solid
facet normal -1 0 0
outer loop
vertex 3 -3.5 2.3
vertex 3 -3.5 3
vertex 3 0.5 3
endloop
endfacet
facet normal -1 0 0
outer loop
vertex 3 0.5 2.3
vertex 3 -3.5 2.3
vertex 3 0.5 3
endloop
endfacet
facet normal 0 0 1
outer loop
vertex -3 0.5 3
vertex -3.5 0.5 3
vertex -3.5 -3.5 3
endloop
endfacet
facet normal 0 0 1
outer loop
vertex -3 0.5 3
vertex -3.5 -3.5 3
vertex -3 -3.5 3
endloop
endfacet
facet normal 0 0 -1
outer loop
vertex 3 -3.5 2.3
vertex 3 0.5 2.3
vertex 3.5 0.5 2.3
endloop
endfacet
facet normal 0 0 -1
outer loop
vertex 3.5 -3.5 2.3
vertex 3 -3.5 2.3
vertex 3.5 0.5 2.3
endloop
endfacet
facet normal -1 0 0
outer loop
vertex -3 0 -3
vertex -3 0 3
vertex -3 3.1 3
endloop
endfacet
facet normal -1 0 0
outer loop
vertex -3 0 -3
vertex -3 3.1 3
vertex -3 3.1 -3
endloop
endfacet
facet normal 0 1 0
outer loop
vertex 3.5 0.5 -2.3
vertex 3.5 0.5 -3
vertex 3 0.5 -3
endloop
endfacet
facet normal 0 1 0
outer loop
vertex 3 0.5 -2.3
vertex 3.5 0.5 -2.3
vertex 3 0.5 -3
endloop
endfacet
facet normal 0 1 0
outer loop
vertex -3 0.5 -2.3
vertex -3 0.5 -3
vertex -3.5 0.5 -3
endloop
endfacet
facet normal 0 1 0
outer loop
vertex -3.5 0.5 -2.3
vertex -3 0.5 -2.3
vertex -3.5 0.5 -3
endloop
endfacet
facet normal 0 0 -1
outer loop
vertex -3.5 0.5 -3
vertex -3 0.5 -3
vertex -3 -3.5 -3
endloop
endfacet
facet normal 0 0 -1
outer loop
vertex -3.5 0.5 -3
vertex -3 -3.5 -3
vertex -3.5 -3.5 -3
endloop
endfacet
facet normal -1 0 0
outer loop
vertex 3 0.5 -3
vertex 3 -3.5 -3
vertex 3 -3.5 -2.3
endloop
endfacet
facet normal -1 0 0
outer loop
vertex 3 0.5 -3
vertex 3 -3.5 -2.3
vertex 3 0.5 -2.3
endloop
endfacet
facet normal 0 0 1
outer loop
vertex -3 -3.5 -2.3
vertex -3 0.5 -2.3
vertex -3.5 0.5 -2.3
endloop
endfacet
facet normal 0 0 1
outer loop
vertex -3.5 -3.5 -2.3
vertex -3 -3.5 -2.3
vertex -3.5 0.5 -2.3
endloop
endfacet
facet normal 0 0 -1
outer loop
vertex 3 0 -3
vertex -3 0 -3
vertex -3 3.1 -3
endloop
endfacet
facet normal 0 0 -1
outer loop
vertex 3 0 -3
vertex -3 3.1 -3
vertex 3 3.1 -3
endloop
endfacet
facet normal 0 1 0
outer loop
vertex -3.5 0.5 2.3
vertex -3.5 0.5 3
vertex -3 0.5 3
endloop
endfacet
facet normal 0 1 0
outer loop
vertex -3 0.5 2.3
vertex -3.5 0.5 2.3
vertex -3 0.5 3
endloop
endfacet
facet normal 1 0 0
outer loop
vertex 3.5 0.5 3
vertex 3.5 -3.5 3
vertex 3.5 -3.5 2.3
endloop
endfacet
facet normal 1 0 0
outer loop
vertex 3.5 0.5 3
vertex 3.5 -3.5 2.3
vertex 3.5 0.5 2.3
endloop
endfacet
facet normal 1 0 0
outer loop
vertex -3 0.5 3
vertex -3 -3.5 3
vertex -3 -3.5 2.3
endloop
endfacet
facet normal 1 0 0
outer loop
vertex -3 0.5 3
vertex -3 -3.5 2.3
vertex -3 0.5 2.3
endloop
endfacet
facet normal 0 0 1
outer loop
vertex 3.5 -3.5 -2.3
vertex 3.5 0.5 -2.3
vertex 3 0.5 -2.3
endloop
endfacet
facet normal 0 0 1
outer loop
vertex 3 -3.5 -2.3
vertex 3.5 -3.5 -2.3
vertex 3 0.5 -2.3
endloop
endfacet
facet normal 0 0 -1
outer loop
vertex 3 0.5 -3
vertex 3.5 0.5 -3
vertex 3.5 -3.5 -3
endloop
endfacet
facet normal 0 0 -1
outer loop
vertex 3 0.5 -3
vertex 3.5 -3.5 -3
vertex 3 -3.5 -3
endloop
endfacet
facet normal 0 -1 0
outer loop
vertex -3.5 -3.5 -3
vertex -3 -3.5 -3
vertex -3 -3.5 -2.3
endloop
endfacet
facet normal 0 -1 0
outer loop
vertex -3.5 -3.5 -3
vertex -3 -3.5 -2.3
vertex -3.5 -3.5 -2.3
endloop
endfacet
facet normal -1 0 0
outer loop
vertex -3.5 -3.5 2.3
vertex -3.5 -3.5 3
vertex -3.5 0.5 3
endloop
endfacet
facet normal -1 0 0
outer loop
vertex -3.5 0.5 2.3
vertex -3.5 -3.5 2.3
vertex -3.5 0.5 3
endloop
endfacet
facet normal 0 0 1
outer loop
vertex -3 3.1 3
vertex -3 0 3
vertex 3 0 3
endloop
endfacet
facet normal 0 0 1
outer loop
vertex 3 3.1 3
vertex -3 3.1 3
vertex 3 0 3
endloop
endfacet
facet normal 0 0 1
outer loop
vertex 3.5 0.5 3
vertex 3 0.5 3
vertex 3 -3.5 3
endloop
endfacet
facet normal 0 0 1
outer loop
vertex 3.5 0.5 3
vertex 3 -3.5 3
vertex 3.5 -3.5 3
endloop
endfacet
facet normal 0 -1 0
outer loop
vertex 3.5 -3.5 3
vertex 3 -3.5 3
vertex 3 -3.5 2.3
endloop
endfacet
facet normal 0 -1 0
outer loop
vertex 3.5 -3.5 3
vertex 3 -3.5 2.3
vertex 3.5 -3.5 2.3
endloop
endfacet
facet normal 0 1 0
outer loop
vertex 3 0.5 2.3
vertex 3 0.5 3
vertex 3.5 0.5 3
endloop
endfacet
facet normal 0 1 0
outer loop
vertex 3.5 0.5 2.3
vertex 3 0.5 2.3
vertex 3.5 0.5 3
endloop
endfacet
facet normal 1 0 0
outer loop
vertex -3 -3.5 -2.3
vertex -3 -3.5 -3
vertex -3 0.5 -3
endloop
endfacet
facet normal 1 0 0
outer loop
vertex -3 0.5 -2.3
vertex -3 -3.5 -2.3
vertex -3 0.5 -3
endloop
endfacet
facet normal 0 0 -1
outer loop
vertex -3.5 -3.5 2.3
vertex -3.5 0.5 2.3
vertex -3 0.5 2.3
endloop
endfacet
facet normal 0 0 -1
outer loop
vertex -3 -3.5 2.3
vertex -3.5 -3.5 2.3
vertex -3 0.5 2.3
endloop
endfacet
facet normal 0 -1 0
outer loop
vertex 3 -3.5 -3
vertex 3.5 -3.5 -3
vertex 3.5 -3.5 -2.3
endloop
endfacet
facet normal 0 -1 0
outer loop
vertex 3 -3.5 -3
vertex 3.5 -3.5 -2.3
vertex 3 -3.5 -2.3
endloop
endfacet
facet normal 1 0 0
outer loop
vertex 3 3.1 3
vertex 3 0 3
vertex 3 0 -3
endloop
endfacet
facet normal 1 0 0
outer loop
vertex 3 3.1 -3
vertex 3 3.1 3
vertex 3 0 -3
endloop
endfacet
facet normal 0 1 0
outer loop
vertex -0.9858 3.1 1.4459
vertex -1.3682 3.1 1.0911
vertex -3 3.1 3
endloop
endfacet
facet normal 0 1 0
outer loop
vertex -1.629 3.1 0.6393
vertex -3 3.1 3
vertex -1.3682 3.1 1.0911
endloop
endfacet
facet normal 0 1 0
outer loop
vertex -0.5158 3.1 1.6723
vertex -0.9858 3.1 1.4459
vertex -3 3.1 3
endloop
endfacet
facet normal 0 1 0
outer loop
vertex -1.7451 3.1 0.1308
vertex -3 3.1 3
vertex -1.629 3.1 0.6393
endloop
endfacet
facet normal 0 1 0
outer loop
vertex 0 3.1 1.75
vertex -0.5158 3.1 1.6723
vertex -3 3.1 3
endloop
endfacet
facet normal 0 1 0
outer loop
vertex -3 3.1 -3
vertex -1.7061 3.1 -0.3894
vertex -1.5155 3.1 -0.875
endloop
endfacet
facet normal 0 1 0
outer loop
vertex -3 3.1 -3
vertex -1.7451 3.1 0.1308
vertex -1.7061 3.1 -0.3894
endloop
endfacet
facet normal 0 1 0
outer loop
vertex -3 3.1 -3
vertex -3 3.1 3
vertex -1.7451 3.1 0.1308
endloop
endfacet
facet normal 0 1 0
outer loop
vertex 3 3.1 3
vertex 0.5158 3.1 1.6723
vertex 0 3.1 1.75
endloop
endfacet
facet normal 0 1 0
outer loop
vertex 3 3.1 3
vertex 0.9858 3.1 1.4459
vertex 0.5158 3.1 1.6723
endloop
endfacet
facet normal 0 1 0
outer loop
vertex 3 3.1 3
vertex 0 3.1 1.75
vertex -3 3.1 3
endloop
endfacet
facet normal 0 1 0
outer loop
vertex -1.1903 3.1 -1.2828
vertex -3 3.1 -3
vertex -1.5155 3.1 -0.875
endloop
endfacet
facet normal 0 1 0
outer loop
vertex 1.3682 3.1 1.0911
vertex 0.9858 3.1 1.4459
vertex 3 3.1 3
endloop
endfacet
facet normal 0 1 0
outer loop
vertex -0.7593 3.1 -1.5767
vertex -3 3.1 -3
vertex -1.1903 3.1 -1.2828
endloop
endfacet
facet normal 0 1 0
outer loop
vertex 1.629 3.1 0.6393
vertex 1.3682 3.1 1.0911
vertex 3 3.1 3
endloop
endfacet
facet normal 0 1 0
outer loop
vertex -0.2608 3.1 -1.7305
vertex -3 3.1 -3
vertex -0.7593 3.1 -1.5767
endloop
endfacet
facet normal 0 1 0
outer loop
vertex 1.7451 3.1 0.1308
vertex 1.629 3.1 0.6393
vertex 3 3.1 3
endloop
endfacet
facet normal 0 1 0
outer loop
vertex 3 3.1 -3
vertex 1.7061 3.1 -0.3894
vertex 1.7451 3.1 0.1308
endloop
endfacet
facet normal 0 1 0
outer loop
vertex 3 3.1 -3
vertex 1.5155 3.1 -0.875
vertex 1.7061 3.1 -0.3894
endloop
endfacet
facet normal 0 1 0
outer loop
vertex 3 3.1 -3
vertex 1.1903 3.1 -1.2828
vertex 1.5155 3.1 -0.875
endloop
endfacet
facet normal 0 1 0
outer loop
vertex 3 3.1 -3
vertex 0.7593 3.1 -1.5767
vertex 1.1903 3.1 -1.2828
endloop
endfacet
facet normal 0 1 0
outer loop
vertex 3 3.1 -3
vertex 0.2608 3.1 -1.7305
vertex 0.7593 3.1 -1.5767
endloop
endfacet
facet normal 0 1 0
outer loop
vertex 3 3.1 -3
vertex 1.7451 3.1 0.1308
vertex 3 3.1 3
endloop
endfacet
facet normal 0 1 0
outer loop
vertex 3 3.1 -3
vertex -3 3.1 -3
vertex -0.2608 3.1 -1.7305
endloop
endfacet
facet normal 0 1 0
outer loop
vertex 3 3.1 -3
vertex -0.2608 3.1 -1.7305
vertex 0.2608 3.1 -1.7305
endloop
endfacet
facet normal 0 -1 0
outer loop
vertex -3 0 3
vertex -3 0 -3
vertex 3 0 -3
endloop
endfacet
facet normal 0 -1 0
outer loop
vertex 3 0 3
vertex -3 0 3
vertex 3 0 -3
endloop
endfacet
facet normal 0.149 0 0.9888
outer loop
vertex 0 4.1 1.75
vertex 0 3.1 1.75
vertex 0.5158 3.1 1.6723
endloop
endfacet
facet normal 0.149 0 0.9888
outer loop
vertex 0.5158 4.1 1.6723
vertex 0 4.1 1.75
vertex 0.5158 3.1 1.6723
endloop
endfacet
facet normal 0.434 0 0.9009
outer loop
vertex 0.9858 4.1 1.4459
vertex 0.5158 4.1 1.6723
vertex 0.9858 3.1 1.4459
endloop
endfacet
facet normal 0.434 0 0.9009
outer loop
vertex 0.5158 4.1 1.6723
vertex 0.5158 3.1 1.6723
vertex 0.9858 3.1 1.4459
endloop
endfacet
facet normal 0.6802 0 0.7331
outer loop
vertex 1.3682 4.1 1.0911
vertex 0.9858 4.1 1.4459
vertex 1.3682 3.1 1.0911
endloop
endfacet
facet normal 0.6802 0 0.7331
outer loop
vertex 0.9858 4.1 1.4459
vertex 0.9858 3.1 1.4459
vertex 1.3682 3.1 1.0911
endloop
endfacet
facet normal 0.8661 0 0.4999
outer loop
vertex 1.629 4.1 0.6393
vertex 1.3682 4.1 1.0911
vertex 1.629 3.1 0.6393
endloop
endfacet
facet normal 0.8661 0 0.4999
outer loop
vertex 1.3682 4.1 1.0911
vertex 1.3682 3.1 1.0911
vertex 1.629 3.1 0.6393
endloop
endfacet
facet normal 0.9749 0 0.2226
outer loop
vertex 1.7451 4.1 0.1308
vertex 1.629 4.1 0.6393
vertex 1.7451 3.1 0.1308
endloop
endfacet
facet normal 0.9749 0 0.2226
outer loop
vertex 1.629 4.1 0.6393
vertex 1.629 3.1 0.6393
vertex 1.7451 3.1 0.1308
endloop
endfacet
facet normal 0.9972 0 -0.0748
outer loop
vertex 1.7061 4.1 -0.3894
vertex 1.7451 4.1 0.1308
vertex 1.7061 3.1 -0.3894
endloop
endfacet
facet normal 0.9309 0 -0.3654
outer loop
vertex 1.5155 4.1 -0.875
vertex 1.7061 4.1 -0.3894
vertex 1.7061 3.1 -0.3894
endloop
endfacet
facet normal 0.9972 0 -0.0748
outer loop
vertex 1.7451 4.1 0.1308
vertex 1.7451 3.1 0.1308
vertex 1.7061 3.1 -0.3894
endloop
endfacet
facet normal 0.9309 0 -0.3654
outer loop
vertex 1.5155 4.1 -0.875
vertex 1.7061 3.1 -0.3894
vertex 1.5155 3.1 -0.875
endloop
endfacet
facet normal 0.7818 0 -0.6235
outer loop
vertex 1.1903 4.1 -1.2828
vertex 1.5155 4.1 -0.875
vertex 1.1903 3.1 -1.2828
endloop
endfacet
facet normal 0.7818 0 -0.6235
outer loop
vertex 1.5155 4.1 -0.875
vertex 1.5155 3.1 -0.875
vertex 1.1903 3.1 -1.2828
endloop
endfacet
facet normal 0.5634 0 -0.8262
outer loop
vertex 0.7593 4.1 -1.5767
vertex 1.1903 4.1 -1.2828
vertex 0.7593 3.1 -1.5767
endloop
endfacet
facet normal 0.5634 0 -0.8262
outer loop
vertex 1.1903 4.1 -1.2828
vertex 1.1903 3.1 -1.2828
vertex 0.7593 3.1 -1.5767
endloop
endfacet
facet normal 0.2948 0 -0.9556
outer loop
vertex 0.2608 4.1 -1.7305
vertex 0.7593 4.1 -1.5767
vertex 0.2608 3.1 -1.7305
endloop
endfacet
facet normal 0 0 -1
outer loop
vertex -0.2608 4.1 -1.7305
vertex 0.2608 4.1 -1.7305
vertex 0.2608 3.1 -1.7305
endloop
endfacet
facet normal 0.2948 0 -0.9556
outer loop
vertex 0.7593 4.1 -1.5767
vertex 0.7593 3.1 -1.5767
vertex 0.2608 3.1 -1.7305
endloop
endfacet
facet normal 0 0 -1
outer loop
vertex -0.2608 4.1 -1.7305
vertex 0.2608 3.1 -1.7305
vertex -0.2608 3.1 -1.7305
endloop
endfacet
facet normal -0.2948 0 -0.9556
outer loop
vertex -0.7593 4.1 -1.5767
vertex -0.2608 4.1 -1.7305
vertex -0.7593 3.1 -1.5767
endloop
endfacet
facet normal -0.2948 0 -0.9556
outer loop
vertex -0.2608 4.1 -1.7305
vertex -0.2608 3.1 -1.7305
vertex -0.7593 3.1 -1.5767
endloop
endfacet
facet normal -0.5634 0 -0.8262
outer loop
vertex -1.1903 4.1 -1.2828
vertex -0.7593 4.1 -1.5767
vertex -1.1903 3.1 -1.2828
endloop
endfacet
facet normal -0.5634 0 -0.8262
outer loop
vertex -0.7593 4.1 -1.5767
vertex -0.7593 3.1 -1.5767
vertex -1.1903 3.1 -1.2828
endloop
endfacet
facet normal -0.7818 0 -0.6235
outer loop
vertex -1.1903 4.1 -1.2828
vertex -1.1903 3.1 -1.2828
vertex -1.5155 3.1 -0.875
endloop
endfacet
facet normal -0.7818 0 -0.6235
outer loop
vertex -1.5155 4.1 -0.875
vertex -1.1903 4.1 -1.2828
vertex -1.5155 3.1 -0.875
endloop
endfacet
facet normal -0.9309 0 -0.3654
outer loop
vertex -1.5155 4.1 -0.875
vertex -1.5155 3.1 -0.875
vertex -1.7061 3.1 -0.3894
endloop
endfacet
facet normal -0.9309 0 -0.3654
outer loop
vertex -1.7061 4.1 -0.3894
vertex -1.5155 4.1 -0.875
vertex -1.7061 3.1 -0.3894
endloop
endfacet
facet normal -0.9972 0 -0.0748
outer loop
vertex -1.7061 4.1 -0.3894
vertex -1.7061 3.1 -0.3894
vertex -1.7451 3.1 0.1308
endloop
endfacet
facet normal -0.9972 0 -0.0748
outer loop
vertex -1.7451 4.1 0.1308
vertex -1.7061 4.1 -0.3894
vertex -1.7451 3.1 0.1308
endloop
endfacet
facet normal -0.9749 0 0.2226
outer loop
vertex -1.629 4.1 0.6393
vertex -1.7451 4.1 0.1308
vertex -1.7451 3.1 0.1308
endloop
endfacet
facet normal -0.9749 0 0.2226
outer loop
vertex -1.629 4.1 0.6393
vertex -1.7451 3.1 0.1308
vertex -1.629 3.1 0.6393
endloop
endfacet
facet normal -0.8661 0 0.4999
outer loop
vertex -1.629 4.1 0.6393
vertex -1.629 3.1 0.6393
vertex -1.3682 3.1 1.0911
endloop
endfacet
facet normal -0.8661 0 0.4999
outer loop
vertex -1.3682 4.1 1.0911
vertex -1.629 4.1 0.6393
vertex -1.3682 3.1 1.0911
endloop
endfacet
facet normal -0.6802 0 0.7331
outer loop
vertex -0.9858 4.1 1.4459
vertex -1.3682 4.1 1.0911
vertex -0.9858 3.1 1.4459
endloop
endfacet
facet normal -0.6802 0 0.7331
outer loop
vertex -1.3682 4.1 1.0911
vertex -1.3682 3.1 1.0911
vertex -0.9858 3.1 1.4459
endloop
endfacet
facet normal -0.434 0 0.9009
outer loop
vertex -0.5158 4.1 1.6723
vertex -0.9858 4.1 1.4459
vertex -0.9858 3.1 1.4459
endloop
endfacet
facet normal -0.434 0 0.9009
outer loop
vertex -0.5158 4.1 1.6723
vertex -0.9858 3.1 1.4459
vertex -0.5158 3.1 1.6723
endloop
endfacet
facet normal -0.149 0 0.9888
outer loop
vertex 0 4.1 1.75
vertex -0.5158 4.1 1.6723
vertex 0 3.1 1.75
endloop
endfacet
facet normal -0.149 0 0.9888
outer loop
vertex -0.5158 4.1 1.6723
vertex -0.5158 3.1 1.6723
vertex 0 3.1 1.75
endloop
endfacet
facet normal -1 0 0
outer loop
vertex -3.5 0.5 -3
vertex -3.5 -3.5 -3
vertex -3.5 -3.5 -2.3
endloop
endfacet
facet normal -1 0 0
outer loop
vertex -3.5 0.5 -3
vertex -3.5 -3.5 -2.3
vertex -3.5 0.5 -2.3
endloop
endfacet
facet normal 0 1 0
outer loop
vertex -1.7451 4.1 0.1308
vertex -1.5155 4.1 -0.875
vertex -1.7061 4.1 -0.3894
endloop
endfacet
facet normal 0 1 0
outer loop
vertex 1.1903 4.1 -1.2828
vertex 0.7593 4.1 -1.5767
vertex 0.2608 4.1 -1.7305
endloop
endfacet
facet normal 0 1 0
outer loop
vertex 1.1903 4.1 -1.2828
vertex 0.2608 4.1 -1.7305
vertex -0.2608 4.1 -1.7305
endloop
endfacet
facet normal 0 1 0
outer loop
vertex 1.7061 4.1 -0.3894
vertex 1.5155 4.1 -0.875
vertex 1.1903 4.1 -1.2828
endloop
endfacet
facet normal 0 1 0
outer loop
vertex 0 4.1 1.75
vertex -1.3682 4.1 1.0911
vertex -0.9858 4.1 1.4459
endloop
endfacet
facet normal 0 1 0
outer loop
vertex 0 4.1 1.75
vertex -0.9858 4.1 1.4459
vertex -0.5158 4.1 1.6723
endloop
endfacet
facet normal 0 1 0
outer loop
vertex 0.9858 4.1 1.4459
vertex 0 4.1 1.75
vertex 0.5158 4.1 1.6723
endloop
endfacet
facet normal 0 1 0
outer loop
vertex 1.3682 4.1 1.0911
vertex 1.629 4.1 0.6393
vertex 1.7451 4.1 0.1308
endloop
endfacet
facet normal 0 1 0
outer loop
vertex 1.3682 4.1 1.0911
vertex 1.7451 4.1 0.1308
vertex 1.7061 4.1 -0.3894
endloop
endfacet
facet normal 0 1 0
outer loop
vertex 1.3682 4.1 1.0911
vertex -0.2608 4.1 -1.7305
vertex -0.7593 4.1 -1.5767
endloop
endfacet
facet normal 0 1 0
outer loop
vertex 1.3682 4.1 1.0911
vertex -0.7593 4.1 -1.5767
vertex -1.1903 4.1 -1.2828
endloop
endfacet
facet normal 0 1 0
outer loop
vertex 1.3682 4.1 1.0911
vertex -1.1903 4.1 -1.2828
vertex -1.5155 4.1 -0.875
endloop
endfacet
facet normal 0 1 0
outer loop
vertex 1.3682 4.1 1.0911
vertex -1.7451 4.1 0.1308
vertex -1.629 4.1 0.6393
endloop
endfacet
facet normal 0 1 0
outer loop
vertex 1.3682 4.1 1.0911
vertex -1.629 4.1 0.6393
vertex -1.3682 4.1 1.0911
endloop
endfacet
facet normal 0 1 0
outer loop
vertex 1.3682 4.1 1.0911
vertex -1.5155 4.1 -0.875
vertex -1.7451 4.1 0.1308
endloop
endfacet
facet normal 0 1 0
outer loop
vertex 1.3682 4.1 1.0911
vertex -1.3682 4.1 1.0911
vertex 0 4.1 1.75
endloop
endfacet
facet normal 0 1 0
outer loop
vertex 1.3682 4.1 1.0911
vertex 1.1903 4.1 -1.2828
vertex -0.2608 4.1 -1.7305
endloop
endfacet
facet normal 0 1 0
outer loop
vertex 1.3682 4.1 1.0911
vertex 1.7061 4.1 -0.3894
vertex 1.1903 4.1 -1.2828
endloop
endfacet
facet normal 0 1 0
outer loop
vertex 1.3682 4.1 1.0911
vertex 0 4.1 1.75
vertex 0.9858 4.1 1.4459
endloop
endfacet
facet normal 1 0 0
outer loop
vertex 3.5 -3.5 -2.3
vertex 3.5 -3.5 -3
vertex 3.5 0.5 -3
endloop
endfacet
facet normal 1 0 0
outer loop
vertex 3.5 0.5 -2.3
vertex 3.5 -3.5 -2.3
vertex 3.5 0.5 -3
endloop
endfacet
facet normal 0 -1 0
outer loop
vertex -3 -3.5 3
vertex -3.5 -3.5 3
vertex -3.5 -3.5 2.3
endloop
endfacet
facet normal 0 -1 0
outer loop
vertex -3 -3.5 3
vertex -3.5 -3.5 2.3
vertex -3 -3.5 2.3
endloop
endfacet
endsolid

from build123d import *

# Parameters (mm, degrees)
SKETCH1_W             = 6
SKETCH1_H             = 6
BOSS_EXTRUDE1_DEPTH   = 3.1
SKETCH2_R             = 1.75
BOSS_EXTRUDE2_DEPTH   = 1
SKETCH3_W             = 0.5
SKETCH3_H             = 4
BOSS_EXTRUDE3_DEPTH   = 0.7
BOSS_EXTRUDE3_2_DEPTH = 0.7
SKETCH4_W             = 0.5
SKETCH4_H             = 4
BOSS_EXTRUDE4_DEPTH   = 0.7
BOSS_EXTRUDE4_2_DEPTH = 0.7


with BuildPart() as part:
    # Sketch1 → Boss-Extrude1 (new body)
    with BuildSketch(Plane(origin=(0, 0, 0), x_dir=(1, 0, 0), z_dir=(0, 1, 0))):
        Rectangle(SKETCH1_W, SKETCH1_H)
    extrude(amount=BOSS_EXTRUDE1_DEPTH)

    # Sketch2 → Boss-Extrude2 (add)
    with BuildSketch(Plane(origin=(0, 3.1, 0), x_dir=(1, 0, 0), z_dir=(0, 1, 0))):
        with Locations(Location((0, 0, 0), (0, 0, 270))):
            Circle(SKETCH2_R)
    extrude(amount=BOSS_EXTRUDE2_DEPTH)


with BuildPart() as body_2:
    # Sketch3 → Boss-Extrude3 (new body)
    with BuildSketch(Plane.XY.offset(3)):
        with Locations((3.25, -1.5)):
            Rectangle(SKETCH3_W, SKETCH3_H)
    extrude(amount=-BOSS_EXTRUDE3_DEPTH)


with BuildPart() as body_3:
    # Sketch3 → Boss-Extrude3 2 (new body)
    with BuildSketch(Plane.XY.offset(3)):
        with Locations((-3.25, -1.5)):
            Rectangle(SKETCH3_W, SKETCH3_H)
    extrude(amount=-BOSS_EXTRUDE3_2_DEPTH)


with BuildPart() as body_4:
    # Sketch4 → Boss-Extrude4 (new body)
    with BuildSketch(Plane(origin=(0, 0, -3), x_dir=(-1, 0, 0), z_dir=(0, 0, -1))):
        with Locations((-3.25, -1.5)):
            Rectangle(SKETCH4_W, SKETCH4_H)
    extrude(amount=-BOSS_EXTRUDE4_DEPTH)


with BuildPart() as body_5:
    # Sketch4 → Boss-Extrude4 2 (new body)
    with BuildSketch(Plane(origin=(0, 0, -3), x_dir=(-1, 0, 0), z_dir=(0, 0, -1))):
        with Locations((3.25, -1.5)):
            Rectangle(SKETCH4_W, SKETCH4_H)
    extrude(amount=-BOSS_EXTRUDE4_2_DEPTH)


solid = Compound([part.part, body_2.part, body_3.part, body_4.part, body_5.part])
